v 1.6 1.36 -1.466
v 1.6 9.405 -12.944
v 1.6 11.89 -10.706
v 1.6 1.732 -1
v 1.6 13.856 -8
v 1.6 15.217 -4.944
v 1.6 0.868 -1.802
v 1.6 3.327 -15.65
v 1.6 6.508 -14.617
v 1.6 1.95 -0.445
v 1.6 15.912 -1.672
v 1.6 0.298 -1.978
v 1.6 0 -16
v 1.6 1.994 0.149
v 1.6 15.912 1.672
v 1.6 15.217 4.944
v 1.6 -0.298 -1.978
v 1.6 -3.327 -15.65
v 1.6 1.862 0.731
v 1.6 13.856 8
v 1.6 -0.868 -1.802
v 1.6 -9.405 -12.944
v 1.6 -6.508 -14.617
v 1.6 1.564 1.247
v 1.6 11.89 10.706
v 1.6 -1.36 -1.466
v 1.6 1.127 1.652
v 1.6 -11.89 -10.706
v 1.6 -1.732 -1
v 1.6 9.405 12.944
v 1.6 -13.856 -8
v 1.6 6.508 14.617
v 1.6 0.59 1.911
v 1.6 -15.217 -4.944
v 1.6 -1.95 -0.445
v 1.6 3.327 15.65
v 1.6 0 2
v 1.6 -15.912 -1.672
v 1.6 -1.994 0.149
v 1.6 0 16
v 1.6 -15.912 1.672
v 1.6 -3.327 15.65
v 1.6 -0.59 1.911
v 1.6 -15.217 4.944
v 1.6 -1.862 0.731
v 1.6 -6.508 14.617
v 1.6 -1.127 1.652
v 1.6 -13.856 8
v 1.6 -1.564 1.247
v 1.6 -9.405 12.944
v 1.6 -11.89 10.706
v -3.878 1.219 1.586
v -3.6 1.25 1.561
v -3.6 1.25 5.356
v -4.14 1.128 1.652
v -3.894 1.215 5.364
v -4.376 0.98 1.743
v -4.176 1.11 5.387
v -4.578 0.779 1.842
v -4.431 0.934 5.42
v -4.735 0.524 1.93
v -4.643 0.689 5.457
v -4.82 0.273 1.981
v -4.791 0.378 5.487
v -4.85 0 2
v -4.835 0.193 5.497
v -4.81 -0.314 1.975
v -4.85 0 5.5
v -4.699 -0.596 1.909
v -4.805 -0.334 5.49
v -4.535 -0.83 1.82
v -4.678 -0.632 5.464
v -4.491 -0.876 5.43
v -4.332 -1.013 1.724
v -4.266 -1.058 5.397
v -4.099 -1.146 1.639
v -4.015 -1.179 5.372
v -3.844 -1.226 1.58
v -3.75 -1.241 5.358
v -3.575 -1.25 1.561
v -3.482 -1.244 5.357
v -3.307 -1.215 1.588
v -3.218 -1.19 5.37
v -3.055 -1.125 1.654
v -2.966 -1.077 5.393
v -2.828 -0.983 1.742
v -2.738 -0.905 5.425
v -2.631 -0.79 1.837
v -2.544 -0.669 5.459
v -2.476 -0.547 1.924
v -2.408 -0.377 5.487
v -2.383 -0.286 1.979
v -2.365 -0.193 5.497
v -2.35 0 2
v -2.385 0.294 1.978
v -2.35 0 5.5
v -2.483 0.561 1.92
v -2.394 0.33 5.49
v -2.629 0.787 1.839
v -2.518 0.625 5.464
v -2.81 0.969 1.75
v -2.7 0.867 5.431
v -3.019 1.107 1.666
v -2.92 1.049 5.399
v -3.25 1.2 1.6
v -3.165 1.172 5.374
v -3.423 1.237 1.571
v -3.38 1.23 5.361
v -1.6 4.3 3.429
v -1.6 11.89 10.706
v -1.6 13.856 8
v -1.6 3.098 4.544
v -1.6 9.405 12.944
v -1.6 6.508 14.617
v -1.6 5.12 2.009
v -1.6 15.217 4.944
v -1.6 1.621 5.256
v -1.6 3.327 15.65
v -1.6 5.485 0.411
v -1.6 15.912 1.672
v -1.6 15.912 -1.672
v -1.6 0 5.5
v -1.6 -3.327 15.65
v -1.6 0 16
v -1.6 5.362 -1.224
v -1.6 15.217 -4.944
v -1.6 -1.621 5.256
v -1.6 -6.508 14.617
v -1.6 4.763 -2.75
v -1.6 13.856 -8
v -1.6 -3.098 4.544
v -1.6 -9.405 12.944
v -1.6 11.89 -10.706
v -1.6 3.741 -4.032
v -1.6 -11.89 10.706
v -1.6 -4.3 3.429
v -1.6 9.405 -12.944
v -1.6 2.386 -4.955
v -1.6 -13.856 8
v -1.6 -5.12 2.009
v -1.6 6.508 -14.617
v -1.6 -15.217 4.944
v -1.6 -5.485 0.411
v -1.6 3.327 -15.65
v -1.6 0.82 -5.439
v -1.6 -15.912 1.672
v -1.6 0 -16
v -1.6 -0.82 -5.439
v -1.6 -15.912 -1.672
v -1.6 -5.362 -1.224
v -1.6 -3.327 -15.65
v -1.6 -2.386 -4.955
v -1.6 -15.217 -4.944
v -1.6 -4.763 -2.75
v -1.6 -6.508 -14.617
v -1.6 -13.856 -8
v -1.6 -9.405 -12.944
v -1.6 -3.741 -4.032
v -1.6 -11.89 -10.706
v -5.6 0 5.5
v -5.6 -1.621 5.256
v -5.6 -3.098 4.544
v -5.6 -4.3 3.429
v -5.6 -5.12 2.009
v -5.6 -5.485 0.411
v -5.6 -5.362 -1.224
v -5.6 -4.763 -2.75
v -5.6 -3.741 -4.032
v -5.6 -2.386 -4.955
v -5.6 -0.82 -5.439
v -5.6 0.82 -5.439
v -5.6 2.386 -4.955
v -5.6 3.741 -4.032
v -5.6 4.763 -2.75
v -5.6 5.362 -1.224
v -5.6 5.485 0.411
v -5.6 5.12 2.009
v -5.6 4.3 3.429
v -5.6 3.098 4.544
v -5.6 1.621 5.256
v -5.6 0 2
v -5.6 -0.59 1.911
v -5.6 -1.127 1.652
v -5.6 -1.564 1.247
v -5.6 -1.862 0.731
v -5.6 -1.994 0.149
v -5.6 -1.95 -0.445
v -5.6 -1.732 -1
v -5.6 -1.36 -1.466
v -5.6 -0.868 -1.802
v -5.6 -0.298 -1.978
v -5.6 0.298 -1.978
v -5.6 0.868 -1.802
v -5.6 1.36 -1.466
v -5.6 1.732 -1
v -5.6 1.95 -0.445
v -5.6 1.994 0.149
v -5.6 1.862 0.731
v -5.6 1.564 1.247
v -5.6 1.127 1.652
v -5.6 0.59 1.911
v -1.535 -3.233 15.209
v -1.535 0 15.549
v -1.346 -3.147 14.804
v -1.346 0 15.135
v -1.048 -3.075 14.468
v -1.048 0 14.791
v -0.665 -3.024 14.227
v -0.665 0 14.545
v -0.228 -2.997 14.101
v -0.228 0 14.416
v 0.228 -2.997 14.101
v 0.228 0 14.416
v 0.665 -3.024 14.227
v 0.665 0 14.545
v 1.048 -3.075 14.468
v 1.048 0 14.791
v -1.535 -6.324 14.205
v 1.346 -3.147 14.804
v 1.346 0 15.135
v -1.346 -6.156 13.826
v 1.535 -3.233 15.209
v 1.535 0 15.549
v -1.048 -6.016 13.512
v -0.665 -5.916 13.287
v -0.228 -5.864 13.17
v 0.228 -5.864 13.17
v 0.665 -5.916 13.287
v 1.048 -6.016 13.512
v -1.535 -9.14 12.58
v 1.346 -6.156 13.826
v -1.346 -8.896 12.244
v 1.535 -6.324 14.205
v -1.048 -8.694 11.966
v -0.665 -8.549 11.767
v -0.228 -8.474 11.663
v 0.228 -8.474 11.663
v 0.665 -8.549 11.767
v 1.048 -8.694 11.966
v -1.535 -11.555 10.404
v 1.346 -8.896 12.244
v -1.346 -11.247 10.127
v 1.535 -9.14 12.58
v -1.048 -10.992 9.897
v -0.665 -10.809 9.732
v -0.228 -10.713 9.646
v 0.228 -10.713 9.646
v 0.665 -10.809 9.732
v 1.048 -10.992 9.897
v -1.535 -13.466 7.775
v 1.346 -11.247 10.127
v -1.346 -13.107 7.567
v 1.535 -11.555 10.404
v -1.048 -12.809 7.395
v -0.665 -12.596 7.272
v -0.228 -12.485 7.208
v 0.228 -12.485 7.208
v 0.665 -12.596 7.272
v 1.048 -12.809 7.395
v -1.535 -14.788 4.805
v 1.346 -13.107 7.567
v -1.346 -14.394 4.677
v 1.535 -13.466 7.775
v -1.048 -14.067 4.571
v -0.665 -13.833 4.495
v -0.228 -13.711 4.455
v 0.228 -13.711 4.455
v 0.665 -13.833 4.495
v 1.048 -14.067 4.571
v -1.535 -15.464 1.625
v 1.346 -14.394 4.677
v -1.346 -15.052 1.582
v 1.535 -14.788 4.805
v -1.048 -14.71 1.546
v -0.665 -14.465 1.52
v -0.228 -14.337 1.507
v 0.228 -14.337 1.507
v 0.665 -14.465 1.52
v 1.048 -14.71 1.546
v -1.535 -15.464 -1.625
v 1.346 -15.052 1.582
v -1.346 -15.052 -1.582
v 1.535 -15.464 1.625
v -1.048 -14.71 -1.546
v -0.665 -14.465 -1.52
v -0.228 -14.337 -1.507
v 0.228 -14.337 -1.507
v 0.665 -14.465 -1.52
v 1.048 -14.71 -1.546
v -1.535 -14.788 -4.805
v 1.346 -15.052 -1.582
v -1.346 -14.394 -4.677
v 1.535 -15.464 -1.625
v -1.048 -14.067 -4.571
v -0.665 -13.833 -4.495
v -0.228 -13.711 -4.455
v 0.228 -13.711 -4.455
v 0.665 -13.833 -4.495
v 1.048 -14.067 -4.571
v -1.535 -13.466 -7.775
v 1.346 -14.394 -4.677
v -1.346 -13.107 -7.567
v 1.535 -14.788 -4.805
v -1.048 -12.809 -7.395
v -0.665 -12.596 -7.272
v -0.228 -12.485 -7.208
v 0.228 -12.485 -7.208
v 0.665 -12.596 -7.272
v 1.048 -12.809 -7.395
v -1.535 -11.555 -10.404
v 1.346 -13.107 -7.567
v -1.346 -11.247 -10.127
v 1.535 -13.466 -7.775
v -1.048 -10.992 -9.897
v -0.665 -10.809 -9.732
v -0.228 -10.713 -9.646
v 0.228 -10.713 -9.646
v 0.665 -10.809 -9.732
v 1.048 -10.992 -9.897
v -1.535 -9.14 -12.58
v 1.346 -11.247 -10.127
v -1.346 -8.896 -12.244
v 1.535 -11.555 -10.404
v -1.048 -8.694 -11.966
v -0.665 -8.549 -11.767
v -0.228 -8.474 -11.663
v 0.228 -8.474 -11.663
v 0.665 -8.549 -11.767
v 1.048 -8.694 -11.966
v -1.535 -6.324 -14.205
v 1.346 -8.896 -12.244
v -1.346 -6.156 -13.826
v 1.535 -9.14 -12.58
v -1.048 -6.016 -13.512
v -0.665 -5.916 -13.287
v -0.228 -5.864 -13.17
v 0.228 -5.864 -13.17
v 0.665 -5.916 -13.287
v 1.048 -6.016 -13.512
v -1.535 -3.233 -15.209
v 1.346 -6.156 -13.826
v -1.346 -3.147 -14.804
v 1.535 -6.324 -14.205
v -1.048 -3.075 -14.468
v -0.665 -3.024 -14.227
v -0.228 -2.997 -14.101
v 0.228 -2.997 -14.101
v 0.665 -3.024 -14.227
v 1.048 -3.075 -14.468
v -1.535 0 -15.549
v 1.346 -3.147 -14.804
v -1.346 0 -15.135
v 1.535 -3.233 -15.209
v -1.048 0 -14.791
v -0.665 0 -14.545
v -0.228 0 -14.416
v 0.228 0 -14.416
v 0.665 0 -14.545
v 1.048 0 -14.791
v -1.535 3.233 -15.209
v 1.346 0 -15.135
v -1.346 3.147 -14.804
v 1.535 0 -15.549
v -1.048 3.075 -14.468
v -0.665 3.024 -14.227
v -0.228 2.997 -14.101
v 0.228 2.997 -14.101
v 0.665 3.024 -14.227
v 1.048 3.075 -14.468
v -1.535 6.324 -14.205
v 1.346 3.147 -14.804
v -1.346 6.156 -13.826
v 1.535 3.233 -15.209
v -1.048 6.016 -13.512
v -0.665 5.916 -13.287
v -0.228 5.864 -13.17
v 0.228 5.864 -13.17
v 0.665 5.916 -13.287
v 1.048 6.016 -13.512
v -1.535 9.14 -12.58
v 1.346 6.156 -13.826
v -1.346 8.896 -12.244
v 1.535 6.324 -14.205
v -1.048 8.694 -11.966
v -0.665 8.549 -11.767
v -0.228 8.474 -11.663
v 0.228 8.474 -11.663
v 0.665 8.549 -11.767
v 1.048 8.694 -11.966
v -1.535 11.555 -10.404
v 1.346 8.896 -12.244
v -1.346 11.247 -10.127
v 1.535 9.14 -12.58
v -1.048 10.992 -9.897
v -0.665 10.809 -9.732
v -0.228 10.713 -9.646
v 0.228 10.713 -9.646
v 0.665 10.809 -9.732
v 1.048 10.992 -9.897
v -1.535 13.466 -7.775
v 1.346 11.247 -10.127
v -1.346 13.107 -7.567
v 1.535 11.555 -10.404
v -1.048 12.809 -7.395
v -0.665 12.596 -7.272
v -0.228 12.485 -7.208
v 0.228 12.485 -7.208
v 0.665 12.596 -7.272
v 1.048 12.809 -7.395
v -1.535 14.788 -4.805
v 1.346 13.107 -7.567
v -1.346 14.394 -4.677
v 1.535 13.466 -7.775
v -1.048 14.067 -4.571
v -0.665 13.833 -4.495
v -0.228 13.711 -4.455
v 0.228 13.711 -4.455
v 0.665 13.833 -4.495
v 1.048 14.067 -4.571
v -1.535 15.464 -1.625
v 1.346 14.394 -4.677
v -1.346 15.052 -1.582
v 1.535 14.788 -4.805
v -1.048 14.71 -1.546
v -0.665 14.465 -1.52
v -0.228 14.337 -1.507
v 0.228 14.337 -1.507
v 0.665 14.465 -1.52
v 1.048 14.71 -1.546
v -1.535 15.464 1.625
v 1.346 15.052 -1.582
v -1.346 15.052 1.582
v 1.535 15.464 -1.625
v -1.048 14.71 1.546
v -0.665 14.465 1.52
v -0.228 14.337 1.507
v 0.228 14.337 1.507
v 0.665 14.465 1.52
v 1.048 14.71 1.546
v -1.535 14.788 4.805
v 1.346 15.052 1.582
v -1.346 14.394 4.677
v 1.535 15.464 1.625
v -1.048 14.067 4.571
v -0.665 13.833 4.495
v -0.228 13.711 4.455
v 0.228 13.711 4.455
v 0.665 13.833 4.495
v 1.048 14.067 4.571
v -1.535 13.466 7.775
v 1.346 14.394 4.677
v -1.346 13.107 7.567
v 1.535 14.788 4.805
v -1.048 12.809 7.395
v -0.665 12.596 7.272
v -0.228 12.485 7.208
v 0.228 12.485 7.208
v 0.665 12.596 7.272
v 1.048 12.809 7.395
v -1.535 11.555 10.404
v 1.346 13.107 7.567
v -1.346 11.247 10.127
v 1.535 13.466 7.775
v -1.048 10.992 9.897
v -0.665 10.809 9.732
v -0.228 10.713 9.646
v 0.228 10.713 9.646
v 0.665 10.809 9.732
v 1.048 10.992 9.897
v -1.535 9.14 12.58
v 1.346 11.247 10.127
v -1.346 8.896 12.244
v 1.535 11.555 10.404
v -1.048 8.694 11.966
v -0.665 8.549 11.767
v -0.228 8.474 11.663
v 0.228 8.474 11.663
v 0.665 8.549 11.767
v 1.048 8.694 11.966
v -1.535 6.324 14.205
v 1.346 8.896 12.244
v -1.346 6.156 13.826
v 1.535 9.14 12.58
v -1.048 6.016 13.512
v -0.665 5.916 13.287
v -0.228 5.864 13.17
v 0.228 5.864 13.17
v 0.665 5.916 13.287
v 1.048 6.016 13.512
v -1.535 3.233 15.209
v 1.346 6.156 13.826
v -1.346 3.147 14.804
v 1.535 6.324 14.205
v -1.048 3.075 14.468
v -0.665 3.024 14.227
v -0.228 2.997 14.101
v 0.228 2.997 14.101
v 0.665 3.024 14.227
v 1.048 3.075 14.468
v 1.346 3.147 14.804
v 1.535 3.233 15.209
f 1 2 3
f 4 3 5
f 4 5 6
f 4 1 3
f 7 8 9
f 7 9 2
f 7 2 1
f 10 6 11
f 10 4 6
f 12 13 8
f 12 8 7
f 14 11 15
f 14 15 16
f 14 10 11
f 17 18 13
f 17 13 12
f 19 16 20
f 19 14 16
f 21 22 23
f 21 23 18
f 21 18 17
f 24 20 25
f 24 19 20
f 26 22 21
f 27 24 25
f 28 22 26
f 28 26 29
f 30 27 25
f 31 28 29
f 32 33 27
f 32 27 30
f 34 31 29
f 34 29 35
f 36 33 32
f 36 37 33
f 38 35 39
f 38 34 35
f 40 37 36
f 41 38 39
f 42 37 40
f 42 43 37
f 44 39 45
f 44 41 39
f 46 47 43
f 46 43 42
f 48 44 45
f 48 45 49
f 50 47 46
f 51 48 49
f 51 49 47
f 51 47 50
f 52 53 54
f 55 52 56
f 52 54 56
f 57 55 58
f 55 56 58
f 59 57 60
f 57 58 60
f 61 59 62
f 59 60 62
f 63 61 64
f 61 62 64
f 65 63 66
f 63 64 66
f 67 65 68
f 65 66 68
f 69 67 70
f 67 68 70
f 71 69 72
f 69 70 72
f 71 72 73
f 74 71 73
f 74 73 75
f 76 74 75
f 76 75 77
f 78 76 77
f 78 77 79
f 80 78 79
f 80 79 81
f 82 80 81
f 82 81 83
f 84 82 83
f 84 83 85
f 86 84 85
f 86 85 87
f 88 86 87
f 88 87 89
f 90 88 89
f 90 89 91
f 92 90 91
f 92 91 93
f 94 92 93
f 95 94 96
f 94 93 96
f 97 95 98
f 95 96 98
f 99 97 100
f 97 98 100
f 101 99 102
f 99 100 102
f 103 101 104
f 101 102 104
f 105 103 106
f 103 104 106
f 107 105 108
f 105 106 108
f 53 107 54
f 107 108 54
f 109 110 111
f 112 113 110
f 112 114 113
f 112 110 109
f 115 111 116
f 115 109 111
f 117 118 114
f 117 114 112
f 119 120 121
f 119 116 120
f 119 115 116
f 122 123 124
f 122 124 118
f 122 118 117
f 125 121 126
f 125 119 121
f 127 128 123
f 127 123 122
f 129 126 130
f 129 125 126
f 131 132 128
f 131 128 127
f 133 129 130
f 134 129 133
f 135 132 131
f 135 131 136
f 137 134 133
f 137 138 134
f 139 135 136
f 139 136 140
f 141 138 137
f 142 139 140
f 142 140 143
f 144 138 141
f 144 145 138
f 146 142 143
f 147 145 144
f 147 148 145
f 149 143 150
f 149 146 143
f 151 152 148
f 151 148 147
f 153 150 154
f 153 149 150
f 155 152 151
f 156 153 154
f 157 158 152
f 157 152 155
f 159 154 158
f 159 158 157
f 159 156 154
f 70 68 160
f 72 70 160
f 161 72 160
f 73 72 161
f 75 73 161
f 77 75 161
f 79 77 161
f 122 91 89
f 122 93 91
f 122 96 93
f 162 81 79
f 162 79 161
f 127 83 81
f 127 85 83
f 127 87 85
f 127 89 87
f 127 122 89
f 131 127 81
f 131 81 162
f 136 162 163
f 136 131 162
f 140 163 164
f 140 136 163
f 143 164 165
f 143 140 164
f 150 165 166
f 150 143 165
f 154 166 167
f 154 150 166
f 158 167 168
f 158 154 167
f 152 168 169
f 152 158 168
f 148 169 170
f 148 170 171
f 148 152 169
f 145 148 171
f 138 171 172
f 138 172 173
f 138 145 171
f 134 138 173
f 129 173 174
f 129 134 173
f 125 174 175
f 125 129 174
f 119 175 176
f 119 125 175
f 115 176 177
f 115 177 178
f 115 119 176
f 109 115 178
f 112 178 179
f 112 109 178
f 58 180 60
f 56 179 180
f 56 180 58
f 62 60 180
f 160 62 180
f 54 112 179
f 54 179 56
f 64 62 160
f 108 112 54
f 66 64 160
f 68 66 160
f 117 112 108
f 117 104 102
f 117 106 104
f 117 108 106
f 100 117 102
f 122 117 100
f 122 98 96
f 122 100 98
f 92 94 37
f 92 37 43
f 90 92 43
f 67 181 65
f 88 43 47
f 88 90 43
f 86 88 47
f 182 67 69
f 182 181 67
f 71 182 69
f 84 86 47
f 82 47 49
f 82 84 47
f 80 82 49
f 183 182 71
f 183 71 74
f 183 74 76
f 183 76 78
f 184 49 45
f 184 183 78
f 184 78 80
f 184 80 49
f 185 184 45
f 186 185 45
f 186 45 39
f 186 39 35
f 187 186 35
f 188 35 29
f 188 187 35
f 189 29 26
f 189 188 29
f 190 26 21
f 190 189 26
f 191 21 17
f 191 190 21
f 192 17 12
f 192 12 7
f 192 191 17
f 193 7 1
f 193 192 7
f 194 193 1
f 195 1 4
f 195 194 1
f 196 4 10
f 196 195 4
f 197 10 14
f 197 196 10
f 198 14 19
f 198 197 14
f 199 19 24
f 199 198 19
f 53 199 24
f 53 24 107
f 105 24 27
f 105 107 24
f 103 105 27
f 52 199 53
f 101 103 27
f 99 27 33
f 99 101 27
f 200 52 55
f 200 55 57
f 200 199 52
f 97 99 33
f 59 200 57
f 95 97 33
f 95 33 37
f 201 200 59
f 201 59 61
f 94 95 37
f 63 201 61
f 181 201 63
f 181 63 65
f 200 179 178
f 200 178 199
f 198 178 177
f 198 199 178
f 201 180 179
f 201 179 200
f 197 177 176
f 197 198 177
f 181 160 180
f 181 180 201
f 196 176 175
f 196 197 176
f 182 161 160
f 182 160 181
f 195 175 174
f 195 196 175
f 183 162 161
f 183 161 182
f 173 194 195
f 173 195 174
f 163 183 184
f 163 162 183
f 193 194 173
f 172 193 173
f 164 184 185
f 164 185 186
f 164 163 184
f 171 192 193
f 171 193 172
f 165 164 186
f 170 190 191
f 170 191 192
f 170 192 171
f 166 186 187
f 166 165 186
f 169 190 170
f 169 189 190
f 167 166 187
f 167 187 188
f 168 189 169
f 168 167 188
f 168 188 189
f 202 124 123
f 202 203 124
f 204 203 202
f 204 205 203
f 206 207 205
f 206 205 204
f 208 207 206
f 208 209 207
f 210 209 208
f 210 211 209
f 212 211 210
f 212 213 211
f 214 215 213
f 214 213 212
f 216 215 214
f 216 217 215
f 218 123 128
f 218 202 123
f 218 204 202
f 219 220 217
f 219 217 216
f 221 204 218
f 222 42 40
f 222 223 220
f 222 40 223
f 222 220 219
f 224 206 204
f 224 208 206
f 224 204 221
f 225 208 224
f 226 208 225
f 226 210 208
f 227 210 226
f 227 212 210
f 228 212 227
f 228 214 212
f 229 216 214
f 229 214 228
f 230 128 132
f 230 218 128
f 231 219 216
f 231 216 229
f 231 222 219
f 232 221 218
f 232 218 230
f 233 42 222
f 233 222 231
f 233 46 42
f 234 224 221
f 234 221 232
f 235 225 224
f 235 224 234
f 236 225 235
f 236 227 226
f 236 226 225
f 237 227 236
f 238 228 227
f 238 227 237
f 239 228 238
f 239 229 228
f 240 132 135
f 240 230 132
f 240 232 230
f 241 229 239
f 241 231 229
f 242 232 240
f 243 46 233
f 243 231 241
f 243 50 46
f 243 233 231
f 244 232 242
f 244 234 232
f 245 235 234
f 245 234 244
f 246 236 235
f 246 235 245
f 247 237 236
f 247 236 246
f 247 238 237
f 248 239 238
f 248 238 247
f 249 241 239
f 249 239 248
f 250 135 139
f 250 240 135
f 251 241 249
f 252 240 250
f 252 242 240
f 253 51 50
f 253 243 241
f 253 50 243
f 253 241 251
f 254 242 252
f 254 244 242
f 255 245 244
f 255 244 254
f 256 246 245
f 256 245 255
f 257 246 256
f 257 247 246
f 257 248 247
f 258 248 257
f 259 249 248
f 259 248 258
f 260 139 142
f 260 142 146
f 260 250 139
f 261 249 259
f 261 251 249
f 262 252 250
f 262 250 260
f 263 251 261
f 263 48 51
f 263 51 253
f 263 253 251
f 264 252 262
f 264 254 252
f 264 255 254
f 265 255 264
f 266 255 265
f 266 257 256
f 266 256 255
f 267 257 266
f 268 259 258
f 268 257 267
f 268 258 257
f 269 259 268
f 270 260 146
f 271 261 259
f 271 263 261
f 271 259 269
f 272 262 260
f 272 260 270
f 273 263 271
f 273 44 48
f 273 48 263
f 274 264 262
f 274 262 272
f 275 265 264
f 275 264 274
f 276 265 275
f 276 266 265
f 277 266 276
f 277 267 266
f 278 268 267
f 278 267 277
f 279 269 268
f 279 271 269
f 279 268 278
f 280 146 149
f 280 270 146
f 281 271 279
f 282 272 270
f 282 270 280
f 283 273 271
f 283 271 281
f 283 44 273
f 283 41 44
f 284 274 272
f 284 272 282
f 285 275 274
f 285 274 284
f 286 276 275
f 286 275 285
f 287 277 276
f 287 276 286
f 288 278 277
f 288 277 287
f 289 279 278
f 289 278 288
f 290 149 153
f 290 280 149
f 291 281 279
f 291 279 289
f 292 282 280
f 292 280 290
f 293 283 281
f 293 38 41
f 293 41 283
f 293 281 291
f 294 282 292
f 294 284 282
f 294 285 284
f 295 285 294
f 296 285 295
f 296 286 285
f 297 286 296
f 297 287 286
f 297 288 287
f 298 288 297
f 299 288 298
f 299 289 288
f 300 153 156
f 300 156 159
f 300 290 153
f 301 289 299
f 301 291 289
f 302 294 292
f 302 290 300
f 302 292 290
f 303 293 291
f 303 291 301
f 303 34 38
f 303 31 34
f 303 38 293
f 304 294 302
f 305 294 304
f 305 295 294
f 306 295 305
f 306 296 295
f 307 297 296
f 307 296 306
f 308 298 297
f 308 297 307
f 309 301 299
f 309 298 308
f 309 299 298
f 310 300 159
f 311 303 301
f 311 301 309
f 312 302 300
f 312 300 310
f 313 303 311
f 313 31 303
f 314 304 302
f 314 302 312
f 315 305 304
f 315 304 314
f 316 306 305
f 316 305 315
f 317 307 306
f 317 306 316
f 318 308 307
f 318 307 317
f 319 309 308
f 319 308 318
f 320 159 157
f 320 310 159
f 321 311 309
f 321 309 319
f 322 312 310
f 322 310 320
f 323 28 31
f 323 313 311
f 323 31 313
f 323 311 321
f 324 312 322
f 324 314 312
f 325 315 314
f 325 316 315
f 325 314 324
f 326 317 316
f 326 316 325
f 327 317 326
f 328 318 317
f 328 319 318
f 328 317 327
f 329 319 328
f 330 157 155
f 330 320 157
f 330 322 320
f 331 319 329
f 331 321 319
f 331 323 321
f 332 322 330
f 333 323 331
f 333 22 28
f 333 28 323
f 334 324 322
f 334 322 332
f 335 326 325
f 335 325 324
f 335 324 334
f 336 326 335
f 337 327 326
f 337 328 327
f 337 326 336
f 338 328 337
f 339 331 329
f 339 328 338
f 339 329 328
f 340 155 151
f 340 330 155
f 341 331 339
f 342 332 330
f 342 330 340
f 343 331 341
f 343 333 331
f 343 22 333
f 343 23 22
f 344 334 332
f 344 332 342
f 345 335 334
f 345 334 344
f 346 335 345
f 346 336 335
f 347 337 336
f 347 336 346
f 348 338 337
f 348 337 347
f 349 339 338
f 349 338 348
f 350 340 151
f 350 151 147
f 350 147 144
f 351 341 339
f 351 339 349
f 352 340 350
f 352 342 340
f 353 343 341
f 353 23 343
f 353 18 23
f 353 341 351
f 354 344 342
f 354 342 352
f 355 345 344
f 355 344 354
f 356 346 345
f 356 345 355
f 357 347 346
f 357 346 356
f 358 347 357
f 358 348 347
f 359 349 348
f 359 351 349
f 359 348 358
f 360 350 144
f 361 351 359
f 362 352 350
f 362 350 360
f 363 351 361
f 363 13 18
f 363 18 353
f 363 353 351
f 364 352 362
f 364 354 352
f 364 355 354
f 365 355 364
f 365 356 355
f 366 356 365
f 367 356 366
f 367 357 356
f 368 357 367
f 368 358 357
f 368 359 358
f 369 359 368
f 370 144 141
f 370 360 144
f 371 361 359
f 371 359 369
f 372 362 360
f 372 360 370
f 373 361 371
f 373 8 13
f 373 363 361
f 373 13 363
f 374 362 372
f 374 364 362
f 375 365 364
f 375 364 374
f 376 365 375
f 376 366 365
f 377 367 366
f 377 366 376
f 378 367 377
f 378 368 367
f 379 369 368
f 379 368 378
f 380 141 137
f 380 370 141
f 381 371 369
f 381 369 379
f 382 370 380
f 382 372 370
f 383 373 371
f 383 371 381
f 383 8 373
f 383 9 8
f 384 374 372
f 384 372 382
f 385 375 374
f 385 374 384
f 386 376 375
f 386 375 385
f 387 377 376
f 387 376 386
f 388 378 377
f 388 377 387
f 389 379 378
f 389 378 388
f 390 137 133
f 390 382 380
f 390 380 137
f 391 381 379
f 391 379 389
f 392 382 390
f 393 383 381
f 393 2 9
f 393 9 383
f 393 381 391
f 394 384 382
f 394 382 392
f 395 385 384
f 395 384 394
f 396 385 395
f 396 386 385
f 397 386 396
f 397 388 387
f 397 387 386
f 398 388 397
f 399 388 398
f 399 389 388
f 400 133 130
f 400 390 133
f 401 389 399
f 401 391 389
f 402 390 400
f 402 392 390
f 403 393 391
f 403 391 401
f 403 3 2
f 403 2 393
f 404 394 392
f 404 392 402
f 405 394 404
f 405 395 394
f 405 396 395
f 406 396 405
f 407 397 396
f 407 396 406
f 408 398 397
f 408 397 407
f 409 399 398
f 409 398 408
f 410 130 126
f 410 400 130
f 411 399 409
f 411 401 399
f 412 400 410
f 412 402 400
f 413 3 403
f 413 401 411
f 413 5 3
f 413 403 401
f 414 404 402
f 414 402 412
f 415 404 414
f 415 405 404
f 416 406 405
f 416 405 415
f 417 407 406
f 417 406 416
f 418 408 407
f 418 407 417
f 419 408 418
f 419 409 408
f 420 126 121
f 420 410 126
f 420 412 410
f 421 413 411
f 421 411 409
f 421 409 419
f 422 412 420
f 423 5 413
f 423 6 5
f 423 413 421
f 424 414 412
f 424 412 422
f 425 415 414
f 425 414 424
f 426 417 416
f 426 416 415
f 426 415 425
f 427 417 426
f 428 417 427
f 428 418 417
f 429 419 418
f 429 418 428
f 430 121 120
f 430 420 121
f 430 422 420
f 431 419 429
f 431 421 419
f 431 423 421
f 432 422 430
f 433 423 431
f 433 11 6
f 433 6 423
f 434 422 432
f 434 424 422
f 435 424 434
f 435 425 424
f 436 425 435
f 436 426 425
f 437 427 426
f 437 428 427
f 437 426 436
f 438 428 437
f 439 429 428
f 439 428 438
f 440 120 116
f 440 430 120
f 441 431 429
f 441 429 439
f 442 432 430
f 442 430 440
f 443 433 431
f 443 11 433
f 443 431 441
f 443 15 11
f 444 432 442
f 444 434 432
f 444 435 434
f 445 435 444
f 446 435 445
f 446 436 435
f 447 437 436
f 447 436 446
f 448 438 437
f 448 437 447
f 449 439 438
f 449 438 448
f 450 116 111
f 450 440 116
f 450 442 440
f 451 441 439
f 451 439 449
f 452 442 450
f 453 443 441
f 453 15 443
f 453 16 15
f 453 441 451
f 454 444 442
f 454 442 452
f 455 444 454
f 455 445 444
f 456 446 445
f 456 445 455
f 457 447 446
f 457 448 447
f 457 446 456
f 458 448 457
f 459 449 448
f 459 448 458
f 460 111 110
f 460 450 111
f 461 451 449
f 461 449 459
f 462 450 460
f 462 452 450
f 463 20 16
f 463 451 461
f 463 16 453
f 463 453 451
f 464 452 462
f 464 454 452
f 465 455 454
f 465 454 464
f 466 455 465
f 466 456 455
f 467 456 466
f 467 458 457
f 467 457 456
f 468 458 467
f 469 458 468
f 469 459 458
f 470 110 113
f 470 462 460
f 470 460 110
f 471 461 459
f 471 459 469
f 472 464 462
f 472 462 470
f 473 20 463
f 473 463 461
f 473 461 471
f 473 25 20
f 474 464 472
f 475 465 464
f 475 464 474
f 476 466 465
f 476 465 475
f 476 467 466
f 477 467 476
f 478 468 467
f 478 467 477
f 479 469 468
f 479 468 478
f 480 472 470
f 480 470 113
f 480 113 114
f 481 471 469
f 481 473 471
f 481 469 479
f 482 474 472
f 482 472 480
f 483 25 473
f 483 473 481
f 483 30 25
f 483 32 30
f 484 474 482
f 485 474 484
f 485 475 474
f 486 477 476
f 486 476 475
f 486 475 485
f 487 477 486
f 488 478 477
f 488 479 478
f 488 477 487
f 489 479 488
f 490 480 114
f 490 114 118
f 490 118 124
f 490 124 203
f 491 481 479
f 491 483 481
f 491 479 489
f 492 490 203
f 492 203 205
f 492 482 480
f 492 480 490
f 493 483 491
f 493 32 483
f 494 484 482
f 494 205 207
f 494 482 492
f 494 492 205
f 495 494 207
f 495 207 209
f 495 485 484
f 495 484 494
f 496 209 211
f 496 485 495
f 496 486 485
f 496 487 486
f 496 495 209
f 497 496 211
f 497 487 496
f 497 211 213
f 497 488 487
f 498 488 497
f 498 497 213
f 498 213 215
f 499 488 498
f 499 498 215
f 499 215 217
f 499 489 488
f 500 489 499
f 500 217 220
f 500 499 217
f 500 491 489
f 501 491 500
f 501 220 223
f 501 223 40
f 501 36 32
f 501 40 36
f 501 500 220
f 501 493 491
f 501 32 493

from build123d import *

# Parameters (mm, degrees)
ESQUISSE2_W = 1.25
ESQUISSE2_H = 16


with BuildPart() as part:
    # Esquisse1 → Révolution1 (revolve)
    with BuildSketch(Plane.XY, mode=Mode.PRIVATE) as r_volution1_sk:
        with BuildLine():
            Line((-5.6, 2), (-5.6, 5.5))
            Line((-5.6, 5.5), (-1.6, 5.5))
            Line((-1.6, 5.5), (-1.6, 16))
            ThreePointArc((-1.6, 16), (0, 14.4), (1.6, 16))
            Line((1.6, 16), (1.6, 2))
            Line((1.6, 2), (-5.6, 2))
        make_face()
    revolve(r_volution1_sk.sketch.rotate(Axis((-24.04155074, 0, 0), (1, 0, 0)), 90), axis=Axis((-24.04155074, 0, 0), (1, 0, 0)))

    # Esquisse2 → Trou taraudé M3x0.51 (revolve, cut)
    with BuildSketch(Plane.YZ.offset(-3.6)):
        with Locations((0.625, 8)):
            Rectangle(ESQUISSE2_W, ESQUISSE2_H)
    revolve(axis=Axis((-3.6, 0, -6.35), (0, 0, 1)), mode=Mode.SUBTRACT)


solid = part.part
